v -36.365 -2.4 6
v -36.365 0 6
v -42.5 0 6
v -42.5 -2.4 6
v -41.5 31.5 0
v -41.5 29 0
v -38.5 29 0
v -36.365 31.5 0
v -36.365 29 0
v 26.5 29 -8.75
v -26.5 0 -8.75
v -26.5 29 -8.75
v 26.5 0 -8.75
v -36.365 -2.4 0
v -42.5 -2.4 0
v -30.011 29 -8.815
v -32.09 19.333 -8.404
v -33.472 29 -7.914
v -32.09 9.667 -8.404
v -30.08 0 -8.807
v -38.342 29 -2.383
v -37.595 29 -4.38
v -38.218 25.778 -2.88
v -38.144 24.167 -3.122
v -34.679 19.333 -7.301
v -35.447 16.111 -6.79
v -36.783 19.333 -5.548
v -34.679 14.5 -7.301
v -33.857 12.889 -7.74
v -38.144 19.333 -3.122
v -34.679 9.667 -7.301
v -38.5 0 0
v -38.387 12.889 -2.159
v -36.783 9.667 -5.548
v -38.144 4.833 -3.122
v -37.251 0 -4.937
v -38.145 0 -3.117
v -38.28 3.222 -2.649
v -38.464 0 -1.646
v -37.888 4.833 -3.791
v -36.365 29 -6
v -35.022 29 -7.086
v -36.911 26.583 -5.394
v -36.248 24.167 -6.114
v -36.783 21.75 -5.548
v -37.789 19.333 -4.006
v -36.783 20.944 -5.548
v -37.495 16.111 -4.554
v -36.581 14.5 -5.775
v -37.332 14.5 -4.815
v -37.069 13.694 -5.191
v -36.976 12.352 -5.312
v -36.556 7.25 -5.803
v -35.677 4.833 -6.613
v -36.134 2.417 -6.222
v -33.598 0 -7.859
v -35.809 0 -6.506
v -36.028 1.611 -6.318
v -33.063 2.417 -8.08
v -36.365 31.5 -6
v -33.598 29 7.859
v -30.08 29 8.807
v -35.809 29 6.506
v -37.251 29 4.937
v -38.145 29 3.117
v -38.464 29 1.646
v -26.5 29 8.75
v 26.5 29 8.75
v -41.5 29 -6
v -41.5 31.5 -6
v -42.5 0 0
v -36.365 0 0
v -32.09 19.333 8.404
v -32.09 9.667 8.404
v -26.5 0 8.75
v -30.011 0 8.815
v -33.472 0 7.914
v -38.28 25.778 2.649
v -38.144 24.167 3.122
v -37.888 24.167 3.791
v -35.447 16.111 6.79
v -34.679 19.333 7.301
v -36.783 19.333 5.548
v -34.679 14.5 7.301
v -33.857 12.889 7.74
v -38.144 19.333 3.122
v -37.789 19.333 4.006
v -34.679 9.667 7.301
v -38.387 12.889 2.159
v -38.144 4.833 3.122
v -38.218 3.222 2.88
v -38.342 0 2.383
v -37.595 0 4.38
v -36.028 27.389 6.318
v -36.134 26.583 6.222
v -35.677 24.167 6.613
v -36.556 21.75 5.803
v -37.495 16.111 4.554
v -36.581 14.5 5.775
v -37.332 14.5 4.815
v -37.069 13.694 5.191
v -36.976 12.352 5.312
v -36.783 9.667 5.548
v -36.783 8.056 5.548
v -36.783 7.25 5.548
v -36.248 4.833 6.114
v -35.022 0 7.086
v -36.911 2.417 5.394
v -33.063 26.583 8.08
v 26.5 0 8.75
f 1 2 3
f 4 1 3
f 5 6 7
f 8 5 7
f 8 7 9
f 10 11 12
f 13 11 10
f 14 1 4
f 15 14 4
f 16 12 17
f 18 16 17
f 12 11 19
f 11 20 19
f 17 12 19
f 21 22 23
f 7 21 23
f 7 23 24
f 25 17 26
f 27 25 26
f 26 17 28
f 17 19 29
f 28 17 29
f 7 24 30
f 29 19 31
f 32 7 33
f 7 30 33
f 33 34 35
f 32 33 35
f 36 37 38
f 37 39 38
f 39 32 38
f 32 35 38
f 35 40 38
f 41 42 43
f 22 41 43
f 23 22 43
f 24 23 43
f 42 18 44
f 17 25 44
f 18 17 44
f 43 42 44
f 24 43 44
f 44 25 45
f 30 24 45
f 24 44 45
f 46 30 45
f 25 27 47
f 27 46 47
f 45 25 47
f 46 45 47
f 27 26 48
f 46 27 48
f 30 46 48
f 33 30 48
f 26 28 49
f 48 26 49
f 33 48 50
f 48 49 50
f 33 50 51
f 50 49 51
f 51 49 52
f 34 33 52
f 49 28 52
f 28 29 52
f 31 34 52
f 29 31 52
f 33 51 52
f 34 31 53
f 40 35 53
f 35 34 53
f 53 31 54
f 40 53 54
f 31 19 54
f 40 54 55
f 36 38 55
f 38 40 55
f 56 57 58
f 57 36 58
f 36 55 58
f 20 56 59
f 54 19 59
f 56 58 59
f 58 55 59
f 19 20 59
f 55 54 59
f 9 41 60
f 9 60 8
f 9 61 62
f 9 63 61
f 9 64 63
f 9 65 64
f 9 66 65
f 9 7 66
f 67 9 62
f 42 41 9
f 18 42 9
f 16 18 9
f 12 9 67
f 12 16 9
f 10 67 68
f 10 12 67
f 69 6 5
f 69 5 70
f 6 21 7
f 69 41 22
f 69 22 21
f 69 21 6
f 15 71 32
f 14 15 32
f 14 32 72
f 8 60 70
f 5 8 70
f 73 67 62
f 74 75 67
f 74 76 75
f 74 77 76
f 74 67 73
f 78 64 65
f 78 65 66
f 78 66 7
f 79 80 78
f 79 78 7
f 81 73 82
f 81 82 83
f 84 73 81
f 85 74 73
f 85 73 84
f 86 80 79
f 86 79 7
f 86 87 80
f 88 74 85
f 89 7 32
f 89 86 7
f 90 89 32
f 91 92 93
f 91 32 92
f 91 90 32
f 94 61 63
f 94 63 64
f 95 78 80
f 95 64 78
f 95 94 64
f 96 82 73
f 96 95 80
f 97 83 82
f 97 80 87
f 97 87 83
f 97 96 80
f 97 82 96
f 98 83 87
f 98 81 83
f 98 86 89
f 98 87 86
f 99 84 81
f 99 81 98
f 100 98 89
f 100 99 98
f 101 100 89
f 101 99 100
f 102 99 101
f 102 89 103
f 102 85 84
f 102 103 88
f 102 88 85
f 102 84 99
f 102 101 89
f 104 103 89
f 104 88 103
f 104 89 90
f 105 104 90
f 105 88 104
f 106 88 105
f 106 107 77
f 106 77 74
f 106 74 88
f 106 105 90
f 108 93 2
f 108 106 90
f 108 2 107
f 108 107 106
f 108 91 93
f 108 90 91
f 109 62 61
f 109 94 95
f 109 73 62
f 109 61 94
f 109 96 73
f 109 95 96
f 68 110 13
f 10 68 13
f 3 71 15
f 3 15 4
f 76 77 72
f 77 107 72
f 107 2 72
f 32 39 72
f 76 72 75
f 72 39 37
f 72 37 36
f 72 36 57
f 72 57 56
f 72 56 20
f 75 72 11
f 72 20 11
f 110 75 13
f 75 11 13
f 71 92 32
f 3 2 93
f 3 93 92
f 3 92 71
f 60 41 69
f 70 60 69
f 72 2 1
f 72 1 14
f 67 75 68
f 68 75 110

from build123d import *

# Parameters (mm, degrees)
SKETCH2_W           = 53
SKETCH2_H           = 17.5
BOSS_EXTRUDE1_DEPTH = 29
BOSS_EXTRUDE2_DEPTH = 2.5
BOSS_EXTRUDE3_DEPTH = 2.4


with BuildPart() as part:
    # Sketch2 → Boss-Extrude1 (new body)
    with BuildSketch(Plane(origin=(0, 0, 0), x_dir=(1, 0, 0), z_dir=(0, 1, 0))):
        Rectangle(SKETCH2_W, SKETCH2_H)
        with BuildLine():
            add(Edge.make_bspline(
                [(-26.5, -8.75), (-31.844612433, -9.598662384), (-38.964801167, -6.953731951), (-38.5, 0)],
                knots=[0, 0, 0, 0, 1, 1, 1, 1], degree=3))
            add(Edge.make_bspline(
                [(-26.5, 8.75), (-31.844612433, 9.598662384), (-38.964801167, 6.953731951), (-38.5, 0)],
                knots=[0, 0, 0, 0, 1, 1, 1, 1], degree=3))
            Line((-26.5, 8.75), (-26.5, -8.75))
        make_face()
    extrude(amount=BOSS_EXTRUDE1_DEPTH)

    # Sketch3 → Boss-Extrude2 (add)
    with BuildSketch(Plane(origin=(0, 29, 0), x_dir=(1, 0, 0), z_dir=(0, 1, 0))):
        Polygon((-38.5, 6), (-36.365233695, 6), (-36.365233695, 0), (-38.5, 0), (-41.5, 0), (-41.5, 6), align=None)
    extrude(amount=BOSS_EXTRUDE2_DEPTH)

    # Sketch4 → Boss-Extrude3 (add)
    with BuildSketch(Plane.XZ):
        Polygon((-38.5, 6), (-36.365233695, 6), (-36.365233695, 0), (-38.5, 0), (-42.5, 0), (-42.5, 6), align=None)
    extrude(amount=BOSS_EXTRUDE3_DEPTH)


solid = part.part
